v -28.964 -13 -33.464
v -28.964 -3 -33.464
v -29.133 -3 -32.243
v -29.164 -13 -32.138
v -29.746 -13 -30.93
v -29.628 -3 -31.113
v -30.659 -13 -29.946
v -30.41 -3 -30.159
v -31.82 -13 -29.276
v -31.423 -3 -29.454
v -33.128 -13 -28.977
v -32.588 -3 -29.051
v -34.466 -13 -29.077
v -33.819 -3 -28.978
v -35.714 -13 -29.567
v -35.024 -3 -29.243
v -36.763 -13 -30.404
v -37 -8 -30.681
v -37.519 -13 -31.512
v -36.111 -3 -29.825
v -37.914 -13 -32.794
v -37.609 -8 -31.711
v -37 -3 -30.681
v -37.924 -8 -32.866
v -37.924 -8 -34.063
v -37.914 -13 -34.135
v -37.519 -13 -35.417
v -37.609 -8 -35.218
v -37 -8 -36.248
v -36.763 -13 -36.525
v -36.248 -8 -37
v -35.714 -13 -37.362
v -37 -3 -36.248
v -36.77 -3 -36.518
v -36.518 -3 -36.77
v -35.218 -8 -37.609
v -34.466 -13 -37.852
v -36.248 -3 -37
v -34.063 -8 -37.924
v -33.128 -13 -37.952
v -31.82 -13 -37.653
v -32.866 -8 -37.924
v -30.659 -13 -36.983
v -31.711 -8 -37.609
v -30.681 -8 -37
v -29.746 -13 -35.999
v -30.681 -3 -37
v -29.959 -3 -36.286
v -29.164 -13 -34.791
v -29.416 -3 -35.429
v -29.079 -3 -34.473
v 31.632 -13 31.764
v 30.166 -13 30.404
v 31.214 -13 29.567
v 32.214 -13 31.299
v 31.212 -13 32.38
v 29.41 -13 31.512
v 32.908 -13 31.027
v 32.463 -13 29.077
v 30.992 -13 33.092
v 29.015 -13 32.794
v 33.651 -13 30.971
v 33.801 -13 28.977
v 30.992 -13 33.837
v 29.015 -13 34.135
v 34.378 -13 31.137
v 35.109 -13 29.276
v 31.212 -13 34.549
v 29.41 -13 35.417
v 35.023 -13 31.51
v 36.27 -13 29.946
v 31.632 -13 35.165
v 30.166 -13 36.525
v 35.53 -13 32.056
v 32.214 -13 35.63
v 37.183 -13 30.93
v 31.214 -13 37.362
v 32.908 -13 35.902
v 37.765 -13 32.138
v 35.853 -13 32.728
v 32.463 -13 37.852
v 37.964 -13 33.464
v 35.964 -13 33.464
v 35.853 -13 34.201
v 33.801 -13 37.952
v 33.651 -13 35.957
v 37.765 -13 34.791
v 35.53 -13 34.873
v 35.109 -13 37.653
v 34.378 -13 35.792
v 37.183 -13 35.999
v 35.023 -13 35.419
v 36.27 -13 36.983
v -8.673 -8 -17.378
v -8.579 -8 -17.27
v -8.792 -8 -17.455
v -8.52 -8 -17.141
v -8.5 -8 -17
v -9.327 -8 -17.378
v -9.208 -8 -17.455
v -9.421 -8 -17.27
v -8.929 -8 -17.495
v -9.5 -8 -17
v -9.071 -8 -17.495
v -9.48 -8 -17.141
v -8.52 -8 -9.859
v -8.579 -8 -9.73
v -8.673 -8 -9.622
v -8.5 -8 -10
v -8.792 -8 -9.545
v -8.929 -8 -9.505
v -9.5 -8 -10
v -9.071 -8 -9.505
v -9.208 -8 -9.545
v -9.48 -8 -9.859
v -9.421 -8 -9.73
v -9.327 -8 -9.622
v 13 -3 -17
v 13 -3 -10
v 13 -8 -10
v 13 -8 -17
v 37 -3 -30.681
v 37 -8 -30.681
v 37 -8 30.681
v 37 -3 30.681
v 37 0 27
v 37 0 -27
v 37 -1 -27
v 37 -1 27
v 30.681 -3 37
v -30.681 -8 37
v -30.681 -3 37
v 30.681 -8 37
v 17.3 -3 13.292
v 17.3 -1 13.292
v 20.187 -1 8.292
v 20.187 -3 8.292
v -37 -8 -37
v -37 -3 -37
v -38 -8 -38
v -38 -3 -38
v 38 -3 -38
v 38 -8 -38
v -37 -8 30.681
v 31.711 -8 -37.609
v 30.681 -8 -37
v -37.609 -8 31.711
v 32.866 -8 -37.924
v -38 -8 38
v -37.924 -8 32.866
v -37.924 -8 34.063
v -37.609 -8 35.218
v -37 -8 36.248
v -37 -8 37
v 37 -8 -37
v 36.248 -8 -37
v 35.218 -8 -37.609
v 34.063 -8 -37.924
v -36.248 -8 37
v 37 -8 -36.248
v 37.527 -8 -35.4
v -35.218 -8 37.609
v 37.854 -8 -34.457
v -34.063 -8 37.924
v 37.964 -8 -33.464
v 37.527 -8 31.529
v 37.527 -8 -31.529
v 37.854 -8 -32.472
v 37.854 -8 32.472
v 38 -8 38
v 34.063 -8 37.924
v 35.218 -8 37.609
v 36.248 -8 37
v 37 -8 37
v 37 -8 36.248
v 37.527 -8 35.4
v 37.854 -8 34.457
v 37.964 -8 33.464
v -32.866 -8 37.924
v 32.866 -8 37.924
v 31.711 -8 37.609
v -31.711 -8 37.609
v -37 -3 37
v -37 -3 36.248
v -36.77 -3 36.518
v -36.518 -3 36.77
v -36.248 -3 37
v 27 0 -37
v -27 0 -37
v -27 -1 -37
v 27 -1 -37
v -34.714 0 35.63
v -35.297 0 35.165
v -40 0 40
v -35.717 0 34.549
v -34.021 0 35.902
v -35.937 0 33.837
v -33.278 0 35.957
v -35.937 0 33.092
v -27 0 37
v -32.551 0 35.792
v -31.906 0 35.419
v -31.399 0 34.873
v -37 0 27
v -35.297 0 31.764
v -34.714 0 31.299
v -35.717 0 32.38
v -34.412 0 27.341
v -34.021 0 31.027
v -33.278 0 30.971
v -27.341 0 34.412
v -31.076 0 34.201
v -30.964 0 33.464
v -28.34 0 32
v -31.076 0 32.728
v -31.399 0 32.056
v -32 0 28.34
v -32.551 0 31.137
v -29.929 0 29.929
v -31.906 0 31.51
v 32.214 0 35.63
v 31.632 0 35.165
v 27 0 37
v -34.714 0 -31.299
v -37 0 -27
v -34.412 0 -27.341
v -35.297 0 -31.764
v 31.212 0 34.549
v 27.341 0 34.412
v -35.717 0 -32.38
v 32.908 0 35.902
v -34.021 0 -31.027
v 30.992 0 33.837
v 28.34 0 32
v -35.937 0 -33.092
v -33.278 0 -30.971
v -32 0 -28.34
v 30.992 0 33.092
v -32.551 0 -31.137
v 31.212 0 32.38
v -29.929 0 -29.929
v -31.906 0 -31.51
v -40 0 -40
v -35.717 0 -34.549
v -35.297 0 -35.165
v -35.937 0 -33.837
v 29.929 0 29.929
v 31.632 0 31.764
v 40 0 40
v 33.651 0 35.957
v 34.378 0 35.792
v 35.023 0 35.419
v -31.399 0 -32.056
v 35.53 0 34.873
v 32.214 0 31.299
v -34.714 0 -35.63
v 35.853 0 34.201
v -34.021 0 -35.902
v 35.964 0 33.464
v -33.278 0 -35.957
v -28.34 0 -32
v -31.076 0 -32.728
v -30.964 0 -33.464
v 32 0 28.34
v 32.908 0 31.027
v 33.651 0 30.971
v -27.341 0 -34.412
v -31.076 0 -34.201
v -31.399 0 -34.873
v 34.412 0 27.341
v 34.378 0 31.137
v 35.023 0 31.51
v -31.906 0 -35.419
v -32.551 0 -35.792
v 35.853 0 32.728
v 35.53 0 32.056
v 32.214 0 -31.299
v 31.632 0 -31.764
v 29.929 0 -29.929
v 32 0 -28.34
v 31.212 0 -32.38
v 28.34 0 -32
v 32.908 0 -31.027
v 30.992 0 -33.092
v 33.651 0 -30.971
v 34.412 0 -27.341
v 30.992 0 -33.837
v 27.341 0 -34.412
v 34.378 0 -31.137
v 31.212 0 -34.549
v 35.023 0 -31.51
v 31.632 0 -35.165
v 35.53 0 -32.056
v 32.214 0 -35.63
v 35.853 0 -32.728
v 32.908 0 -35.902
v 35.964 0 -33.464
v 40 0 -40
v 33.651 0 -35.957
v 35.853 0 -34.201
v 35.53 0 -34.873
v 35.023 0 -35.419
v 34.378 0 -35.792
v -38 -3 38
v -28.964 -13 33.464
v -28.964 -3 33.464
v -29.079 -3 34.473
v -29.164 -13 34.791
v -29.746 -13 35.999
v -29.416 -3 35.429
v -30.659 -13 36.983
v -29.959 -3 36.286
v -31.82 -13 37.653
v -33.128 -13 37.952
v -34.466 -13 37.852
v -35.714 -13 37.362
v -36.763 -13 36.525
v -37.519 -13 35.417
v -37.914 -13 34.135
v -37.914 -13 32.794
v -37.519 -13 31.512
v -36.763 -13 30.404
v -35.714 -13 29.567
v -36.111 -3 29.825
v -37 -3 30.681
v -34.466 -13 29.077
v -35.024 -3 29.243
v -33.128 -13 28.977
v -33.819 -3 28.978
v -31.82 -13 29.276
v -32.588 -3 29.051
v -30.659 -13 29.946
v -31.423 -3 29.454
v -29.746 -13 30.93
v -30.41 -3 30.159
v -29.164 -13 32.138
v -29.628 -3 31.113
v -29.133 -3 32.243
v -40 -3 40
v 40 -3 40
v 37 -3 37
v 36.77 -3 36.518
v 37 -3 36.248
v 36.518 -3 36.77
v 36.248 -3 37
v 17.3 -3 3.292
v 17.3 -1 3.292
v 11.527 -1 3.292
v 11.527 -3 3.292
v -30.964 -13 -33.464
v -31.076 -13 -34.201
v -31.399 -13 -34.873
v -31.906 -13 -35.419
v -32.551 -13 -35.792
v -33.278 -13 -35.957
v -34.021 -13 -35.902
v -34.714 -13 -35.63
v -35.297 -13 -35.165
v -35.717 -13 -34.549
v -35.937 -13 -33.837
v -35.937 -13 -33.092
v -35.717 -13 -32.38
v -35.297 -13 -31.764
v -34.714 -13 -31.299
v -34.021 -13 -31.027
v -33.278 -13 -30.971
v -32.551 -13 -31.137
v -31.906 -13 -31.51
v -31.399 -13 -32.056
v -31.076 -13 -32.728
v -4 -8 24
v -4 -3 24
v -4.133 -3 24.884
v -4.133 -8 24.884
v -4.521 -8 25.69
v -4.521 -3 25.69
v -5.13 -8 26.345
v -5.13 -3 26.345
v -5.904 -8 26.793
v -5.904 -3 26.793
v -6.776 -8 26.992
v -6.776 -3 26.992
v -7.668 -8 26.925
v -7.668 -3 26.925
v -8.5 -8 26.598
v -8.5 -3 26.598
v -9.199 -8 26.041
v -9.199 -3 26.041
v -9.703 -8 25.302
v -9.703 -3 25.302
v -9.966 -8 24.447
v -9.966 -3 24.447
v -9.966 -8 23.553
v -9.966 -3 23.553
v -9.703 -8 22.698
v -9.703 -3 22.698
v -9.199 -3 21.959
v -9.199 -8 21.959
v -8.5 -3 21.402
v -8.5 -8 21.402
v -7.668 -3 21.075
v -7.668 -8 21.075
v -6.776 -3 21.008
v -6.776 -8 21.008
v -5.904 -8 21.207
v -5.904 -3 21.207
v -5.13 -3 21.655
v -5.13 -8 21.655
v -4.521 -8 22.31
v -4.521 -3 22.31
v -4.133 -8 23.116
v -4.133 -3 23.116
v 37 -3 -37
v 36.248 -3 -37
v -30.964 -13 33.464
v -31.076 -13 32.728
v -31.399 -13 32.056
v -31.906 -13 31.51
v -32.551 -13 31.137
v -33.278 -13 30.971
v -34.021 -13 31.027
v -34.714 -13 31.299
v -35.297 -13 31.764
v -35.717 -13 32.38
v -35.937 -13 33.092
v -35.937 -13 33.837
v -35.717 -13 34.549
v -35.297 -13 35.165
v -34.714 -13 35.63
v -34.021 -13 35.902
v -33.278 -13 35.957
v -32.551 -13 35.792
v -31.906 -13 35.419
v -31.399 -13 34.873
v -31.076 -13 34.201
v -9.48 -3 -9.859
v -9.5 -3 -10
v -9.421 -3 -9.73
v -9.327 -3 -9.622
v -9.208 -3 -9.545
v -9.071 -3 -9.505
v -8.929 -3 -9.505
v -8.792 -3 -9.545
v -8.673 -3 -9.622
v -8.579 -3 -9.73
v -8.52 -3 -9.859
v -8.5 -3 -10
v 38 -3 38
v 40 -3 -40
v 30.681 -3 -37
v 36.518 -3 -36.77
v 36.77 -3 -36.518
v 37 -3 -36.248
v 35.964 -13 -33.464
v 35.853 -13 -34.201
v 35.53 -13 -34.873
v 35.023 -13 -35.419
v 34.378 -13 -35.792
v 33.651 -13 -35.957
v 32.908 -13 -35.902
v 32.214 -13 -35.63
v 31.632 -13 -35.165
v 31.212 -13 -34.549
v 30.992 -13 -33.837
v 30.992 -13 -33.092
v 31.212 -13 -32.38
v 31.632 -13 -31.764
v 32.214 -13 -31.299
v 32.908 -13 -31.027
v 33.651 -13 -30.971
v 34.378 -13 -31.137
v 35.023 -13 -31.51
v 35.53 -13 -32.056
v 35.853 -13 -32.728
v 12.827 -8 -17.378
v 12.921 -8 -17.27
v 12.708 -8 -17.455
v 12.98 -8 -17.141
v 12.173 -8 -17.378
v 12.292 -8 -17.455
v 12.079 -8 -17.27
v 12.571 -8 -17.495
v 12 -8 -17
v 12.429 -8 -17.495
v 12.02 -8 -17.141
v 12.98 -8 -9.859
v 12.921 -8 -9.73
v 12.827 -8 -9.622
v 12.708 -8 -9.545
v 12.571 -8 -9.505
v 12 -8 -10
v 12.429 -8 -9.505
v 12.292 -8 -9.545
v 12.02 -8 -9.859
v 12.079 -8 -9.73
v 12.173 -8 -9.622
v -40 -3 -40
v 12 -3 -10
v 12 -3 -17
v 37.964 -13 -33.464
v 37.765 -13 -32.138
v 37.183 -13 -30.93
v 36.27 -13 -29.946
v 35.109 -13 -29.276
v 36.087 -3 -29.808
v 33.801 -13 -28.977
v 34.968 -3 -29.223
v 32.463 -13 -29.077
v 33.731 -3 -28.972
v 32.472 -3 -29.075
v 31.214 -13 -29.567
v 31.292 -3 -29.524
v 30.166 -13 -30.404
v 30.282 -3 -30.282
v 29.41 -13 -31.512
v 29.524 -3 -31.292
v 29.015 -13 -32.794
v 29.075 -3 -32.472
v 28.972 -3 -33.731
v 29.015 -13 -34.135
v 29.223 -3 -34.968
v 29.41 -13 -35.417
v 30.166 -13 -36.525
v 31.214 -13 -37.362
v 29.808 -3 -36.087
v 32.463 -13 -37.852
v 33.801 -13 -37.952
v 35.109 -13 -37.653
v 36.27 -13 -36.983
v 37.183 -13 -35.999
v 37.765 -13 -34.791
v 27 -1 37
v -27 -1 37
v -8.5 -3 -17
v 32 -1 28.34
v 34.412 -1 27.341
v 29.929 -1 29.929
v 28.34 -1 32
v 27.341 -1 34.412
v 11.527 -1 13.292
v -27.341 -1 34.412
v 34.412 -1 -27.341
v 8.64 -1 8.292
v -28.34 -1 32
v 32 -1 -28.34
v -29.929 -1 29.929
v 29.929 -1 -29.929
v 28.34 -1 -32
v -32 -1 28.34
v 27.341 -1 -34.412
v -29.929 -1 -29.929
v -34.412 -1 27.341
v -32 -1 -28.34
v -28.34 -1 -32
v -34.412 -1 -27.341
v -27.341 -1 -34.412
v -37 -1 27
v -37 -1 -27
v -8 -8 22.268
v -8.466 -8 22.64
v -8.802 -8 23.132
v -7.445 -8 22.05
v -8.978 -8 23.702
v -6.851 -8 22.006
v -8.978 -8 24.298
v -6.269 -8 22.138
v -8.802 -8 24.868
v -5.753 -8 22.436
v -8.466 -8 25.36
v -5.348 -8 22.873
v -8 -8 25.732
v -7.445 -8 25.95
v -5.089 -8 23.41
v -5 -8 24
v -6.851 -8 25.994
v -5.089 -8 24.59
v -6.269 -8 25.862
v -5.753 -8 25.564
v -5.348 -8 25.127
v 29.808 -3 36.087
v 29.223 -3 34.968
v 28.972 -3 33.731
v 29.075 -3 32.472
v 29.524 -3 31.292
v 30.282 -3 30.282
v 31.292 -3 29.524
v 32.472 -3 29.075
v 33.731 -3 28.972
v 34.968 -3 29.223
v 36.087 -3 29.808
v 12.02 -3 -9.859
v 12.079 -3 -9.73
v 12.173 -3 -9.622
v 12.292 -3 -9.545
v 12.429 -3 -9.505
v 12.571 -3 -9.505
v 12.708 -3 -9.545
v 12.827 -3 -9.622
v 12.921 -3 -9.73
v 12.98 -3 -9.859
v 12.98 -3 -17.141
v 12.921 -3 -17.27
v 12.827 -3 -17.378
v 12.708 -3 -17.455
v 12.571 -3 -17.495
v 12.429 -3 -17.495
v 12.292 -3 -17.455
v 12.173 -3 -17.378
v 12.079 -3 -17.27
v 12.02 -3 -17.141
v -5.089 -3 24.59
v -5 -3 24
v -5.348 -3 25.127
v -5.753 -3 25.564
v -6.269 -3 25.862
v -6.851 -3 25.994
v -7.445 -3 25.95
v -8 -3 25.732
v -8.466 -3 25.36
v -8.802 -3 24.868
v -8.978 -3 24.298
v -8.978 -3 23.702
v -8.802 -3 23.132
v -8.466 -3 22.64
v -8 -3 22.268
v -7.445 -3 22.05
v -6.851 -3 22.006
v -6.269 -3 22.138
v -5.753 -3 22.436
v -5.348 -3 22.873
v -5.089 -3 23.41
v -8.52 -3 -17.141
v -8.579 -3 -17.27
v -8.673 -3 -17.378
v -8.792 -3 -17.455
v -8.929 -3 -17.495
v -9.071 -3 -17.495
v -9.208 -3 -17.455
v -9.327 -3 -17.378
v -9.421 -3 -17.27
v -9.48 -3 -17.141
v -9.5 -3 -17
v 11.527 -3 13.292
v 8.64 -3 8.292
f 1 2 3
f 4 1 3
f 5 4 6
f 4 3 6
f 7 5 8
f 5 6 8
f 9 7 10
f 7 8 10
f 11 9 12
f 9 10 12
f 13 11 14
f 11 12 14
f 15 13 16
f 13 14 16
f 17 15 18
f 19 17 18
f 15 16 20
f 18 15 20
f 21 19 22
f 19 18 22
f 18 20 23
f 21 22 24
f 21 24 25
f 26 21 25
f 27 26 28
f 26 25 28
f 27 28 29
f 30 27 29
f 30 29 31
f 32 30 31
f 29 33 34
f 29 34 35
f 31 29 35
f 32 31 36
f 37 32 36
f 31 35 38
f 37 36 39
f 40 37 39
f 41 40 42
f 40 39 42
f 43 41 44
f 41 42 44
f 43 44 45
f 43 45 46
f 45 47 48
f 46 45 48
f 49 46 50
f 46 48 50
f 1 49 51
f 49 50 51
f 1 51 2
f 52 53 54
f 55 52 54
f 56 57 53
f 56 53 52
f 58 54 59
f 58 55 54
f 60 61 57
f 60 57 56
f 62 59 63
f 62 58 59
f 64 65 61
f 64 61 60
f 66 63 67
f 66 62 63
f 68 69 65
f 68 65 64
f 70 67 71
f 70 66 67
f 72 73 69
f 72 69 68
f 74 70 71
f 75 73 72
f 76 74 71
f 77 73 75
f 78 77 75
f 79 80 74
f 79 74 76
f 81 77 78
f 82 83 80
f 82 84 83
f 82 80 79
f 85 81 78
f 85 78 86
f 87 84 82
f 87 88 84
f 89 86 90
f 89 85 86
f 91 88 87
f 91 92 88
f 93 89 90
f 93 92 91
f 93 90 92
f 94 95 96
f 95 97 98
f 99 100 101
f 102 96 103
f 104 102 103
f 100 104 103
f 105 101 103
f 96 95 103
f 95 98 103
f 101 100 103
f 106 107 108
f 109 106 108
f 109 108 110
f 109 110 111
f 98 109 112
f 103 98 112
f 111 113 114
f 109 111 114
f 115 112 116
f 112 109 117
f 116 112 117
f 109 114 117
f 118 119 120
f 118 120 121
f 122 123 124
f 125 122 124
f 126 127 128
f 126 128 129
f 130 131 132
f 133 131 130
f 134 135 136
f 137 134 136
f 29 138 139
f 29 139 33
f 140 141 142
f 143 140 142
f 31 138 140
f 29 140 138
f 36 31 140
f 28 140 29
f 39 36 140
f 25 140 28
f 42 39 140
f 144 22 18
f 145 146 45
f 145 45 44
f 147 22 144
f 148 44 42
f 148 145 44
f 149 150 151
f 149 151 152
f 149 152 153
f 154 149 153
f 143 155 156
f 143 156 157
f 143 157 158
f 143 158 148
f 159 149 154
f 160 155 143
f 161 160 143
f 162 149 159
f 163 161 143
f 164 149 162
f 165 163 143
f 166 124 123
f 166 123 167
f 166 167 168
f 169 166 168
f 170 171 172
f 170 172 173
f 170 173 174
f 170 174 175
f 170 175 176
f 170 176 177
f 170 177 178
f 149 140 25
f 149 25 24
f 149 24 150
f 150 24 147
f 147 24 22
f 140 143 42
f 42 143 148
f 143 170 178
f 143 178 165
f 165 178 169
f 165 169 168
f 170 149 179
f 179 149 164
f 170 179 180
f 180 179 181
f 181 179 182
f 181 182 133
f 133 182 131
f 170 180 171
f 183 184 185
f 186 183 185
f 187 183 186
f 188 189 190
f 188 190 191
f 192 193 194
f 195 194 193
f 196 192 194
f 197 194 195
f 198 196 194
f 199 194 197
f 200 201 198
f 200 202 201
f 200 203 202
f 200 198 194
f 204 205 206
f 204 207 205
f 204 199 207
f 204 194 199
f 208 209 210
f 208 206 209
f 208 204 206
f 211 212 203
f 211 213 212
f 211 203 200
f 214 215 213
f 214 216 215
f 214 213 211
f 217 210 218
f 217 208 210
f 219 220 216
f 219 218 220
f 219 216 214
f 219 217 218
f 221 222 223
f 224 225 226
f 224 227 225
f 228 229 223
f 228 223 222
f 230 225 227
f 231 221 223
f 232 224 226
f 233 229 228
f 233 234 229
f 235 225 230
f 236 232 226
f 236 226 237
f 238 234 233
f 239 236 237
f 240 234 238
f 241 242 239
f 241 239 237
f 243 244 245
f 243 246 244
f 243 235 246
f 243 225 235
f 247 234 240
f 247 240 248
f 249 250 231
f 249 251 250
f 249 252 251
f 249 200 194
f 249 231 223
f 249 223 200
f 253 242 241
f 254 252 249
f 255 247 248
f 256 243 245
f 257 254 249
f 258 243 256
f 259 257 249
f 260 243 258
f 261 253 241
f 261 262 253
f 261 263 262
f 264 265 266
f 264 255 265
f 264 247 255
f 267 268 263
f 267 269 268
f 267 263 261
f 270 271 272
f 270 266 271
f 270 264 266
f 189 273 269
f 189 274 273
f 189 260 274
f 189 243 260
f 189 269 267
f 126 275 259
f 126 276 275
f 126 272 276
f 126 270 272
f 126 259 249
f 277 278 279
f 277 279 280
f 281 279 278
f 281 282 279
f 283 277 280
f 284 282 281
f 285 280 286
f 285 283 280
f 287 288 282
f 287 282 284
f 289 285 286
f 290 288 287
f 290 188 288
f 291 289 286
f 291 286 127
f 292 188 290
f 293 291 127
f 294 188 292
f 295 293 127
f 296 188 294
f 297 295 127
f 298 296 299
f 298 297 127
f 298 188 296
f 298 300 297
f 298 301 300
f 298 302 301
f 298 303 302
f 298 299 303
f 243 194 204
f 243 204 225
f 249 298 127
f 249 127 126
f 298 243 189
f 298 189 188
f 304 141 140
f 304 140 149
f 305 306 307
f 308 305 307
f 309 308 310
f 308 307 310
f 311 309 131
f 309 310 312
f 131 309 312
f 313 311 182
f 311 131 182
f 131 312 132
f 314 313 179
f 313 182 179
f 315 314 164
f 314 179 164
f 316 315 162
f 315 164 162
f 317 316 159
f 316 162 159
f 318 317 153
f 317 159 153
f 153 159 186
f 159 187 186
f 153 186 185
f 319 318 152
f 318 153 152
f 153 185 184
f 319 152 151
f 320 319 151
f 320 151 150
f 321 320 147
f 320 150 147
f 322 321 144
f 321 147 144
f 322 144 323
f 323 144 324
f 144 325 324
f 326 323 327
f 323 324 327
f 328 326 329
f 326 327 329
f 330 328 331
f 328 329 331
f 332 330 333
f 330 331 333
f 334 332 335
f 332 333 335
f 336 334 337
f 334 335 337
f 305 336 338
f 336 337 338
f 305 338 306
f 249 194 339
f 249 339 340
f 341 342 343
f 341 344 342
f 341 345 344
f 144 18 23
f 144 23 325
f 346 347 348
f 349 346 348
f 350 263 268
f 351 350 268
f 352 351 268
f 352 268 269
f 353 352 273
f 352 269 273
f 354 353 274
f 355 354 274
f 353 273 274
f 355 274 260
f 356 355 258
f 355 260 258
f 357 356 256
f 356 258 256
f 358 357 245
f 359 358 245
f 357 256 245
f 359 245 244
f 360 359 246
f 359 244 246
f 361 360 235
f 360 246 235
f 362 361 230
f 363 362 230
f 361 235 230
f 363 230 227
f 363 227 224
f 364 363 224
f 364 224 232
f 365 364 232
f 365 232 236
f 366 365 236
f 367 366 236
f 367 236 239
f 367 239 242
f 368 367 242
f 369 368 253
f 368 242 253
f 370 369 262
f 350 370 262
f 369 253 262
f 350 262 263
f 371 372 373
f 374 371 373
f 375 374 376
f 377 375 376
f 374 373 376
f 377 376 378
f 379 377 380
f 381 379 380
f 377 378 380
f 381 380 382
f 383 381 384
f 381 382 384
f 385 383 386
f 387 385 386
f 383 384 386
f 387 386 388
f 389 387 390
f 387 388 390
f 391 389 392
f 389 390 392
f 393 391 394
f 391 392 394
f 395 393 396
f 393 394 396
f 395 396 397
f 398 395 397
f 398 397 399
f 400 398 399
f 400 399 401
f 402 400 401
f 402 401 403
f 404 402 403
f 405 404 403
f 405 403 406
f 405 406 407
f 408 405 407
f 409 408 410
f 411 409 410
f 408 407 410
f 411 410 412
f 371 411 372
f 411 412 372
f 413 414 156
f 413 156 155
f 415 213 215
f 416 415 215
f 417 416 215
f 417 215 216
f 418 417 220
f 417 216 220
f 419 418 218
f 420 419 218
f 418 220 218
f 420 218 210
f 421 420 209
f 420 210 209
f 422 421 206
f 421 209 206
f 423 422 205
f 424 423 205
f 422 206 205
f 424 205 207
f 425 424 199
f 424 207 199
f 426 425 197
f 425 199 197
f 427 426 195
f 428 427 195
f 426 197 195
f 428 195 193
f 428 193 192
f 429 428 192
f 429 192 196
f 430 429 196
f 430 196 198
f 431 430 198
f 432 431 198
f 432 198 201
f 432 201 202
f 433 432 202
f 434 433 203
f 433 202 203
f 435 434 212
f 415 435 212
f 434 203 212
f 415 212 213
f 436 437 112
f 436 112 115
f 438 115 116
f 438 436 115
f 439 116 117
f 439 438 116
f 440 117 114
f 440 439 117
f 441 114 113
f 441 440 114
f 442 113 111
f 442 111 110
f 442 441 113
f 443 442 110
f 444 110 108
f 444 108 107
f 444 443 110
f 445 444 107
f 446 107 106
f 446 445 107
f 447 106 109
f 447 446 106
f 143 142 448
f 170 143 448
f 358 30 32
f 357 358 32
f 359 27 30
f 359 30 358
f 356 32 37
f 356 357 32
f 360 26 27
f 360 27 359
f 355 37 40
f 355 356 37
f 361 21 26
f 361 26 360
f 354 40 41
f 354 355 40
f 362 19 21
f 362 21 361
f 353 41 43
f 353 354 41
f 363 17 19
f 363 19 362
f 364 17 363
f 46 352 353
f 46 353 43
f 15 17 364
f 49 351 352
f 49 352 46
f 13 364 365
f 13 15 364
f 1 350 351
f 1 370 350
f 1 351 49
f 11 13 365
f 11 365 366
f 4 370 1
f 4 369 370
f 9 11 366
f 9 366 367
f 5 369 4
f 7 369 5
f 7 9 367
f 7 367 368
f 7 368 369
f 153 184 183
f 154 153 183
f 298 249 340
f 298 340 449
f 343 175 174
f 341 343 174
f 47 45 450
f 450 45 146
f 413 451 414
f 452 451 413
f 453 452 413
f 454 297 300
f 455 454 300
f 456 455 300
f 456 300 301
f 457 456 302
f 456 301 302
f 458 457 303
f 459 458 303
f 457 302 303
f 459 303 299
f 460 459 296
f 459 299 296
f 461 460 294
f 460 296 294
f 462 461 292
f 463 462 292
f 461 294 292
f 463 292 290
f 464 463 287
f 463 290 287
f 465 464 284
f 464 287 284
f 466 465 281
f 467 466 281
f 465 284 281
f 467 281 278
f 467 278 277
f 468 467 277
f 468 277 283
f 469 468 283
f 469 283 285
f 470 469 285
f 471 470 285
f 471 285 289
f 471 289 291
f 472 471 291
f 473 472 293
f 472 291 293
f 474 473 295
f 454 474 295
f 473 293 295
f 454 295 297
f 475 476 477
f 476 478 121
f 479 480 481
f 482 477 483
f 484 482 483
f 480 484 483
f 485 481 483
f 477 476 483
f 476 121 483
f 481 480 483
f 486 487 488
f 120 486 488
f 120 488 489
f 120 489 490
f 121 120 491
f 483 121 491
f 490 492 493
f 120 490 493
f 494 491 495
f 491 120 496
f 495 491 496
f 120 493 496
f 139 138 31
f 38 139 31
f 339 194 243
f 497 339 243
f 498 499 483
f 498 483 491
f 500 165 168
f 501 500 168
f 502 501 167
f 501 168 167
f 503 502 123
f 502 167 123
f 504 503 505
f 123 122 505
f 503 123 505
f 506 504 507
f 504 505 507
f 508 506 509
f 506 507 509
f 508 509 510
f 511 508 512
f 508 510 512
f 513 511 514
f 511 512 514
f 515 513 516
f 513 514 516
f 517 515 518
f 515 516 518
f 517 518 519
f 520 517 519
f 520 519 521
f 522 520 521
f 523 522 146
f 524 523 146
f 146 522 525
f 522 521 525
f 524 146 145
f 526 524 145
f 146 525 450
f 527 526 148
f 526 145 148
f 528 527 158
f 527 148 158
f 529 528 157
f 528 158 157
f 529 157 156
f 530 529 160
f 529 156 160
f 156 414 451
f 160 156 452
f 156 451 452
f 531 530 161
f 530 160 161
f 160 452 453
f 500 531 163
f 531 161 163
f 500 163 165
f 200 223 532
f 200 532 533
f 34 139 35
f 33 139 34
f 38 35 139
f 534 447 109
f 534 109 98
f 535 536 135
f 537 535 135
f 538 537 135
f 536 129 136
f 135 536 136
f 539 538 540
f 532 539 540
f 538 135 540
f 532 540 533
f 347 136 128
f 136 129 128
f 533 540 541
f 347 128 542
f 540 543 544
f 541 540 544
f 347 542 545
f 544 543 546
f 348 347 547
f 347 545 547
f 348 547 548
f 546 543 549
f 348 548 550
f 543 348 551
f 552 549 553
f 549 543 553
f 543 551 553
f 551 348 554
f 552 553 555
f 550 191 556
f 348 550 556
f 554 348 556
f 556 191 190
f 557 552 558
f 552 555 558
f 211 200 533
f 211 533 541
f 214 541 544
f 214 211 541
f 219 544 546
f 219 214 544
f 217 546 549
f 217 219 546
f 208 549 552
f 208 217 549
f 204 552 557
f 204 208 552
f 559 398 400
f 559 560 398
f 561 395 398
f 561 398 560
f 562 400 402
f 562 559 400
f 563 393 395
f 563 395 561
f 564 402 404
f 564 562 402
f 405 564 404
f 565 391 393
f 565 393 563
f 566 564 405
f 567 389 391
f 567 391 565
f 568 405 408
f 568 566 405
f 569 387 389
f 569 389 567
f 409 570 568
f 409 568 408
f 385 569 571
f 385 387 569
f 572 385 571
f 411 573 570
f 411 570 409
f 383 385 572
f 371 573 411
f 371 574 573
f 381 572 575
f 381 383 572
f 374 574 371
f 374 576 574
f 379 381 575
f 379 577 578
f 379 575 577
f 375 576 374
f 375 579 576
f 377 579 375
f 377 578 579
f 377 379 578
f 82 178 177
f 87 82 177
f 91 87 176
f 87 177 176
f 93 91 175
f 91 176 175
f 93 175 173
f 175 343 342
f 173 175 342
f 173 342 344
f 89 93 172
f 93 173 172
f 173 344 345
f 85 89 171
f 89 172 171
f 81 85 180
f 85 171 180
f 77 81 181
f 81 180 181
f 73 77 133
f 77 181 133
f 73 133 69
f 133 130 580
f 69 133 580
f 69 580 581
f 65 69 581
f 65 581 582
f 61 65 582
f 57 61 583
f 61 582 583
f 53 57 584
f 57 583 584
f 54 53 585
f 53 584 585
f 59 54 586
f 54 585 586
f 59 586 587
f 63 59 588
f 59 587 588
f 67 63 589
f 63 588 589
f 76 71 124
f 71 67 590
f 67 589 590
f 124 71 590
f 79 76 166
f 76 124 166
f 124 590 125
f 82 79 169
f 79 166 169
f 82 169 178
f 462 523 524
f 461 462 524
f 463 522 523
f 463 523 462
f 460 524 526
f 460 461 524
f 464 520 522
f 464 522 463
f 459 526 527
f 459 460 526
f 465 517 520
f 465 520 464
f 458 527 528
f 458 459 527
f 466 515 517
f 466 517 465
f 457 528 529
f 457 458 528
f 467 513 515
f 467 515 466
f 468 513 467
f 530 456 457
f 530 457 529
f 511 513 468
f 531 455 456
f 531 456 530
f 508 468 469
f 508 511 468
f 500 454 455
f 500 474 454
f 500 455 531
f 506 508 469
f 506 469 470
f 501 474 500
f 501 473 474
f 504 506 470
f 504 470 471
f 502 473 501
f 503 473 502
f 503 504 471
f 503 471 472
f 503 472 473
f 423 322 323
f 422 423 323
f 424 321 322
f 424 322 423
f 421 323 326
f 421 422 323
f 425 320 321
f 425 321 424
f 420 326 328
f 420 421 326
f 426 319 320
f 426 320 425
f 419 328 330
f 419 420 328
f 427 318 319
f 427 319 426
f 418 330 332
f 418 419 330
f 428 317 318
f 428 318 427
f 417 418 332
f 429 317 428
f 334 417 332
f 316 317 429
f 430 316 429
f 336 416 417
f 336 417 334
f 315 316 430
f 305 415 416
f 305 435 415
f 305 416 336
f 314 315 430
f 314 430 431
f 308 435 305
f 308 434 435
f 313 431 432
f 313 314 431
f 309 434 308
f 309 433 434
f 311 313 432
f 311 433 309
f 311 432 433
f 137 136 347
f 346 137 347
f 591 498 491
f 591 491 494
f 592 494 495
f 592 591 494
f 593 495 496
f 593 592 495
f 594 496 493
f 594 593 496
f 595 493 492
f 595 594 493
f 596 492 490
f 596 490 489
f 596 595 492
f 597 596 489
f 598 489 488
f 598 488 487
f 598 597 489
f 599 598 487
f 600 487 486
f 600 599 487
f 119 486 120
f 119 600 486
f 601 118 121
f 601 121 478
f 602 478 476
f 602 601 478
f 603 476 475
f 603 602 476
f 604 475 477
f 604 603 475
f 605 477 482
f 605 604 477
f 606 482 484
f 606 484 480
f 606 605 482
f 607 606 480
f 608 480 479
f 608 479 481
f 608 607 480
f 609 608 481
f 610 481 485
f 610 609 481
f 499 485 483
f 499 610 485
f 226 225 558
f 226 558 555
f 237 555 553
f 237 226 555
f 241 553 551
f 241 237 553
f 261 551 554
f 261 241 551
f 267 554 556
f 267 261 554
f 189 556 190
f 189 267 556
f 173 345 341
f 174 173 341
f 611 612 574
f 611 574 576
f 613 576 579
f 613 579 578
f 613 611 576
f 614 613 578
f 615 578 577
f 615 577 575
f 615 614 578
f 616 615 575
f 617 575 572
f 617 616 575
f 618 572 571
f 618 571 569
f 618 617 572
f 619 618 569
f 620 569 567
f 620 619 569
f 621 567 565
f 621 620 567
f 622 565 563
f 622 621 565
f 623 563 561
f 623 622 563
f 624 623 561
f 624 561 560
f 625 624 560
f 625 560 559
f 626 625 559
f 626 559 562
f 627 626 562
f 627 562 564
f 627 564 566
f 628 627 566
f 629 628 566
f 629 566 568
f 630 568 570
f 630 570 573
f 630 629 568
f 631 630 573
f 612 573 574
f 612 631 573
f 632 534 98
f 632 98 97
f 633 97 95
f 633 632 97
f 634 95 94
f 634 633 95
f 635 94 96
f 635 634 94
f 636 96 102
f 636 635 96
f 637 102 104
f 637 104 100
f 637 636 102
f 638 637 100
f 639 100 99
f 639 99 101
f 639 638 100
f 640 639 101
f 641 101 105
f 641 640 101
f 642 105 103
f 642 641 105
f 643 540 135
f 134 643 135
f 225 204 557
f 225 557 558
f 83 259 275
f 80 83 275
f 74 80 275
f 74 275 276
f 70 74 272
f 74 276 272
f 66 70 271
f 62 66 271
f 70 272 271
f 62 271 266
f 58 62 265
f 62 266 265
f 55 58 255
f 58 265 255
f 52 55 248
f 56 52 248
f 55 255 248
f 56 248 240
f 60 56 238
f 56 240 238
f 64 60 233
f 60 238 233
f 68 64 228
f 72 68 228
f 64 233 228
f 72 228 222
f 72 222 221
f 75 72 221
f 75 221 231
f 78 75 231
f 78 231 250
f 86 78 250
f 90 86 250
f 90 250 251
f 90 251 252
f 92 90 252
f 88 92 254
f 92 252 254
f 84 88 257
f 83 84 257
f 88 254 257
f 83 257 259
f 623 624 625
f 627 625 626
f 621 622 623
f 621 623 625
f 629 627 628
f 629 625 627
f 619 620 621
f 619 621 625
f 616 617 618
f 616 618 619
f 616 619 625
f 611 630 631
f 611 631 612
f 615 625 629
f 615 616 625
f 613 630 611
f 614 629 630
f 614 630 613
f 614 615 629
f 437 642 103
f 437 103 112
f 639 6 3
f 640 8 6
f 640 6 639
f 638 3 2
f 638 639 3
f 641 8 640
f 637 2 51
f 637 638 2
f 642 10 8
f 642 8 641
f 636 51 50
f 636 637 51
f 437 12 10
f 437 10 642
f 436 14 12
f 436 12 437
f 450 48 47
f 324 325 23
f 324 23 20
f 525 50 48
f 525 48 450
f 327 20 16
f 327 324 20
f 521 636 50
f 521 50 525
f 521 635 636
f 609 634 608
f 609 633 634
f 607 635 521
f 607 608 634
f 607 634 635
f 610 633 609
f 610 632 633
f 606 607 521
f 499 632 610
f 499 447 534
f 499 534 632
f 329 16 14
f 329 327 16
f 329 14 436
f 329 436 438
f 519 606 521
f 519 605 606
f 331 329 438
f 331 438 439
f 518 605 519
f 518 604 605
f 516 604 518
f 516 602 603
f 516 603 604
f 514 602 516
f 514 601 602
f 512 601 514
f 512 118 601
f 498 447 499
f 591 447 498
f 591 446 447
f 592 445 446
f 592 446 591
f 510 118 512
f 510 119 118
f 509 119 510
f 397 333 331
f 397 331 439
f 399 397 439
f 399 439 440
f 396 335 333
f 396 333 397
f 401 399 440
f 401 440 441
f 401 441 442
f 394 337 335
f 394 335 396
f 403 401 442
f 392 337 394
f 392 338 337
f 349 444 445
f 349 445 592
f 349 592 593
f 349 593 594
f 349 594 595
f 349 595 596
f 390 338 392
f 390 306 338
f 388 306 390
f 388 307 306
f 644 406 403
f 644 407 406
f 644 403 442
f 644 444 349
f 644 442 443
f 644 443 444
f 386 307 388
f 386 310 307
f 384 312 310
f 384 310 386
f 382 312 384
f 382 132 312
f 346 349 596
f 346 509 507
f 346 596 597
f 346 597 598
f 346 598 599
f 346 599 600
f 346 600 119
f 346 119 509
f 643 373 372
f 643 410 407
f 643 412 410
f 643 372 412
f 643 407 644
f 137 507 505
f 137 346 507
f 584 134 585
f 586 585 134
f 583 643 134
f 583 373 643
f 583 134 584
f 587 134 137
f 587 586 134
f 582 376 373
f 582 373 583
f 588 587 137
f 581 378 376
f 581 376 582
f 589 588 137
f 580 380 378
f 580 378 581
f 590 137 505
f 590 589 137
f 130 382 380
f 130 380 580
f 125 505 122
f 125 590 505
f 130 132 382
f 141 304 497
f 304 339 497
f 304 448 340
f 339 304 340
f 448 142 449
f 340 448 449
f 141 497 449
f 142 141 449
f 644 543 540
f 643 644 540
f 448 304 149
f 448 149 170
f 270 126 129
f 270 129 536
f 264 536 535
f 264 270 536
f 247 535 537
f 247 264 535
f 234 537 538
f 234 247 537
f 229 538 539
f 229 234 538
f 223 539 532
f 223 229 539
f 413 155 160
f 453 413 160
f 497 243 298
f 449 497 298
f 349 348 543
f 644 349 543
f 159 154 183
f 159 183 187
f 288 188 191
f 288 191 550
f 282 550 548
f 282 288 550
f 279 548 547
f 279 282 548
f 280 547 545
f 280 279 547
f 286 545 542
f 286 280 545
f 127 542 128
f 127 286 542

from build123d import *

# Parameters (mm, degrees)
SKETCH2_W           = 80
SKETCH2_H           = 80
BOSS_EXTRUDE1_DEPTH = 3
CUT_EXTRUDE1_DEPTH  = 1
SKETCH5_W           = 76
SKETCH5_H           = 76
BOSS_EXTRUDE2_DEPTH = 5
SKETCH6_W           = 74
SKETCH6_H           = 74
CUT_EXTRUDE2_DEPTH  = 5
SKETCH7_R           = 4.5
BOSS_EXTRUDE3_DEPTH = 10
SKETCH4_R           = 2.5
CUT_EXTRUDE8_DEPTH  = 13
SKETCH9_R           = 3
SKETCH9_R_2         = 2
BOSS_EXTRUDE4_DEPTH = 5
BOSS_EXTRUDE5_DEPTH = 5
CUT_EXTRUDE9_DEPTH  = 10


with BuildPart() as part:
    # Sketch2 → Boss-Extrude1 (new body)
    with BuildSketch(Plane(origin=(0, 0, 0), x_dir=(1, 0, 0), z_dir=(0, 1, 0))):
        Rectangle(SKETCH2_W, SKETCH2_H)
    extrude(amount=-BOSS_EXTRUDE1_DEPTH)

    # Sketch3 → Cut-Extrude1 (cut)
    with BuildSketch(Plane(origin=(0, 0, 0), x_dir=(1, 0, 0), z_dir=(0, 1, 0))):
        with BuildLine():
            Line((-27, 37), (27, 37))
            ThreePointArc((27, 37), (29.928932188, 29.928932188), (37, 27))
            Line((37, 27), (37, -27))
            ThreePointArc((37, -27), (29.928932188, -29.928932188), (27, -37))
            Line((27, -37), (-27, -37))
            ThreePointArc((-27, -37), (-29.928932188, -29.928932188), (-37, -27))
            Line((-37, -27), (-37, 27))
            ThreePointArc((-37, 27), (-29.928932188, 29.928932188), (-27, 37))
        make_face()
    extrude(amount=-CUT_EXTRUDE1_DEPTH, mode=Mode.SUBTRACT)

    # Sketch5 → Boss-Extrude2 (add)
    with BuildSketch(Plane.XZ.offset(3)):
        Rectangle(SKETCH5_W, SKETCH5_H)
    extrude(amount=BOSS_EXTRUDE2_DEPTH)

    # Sketch6 → Cut-Extrude2 (cut)
    with BuildSketch(Plane.XZ.offset(8)):
        Rectangle(SKETCH6_W, SKETCH6_H)
    extrude(amount=-CUT_EXTRUDE2_DEPTH, mode=Mode.SUBTRACT)

    # Sketch7 → Boss-Extrude3 (add)
    with BuildSketch(Plane.XZ.offset(3)):
        with Locations((-33.464466094, 33.46446609)):
            Circle(SKETCH7_R)
        with Locations((33.46446609, 33.46446609)):
            Circle(SKETCH7_R)
        with Locations((-33.464466094, -33.464466094)):
            Circle(SKETCH7_R)
        with Locations((33.46446609, -33.464466094)):
            Circle(SKETCH7_R)
    extrude(amount=BOSS_EXTRUDE3_DEPTH)

    # Sketch4 → Cut-Extrude8 (cut)
    with BuildSketch(Plane(origin=(0, 0, 0), x_dir=(1, 0, 0), z_dir=(0, 1, 0))):
        with Locations((33.46446609, 33.464466094)):
            Circle(SKETCH4_R)
        with Locations((-33.464466094, 33.464466094)):
            Circle(SKETCH4_R)
        with Locations((-33.464466094, -33.46446609)):
            Circle(SKETCH4_R)
        with Locations((33.46446609, -33.46446609)):
            Circle(SKETCH4_R)
    extrude(amount=-CUT_EXTRUDE8_DEPTH, mode=Mode.SUBTRACT)

    # Sketch9 → Boss-Extrude4 (add)
    with BuildSketch(Plane.XZ.offset(3)):
        with Locations((-7, 24)):
            Circle(SKETCH9_R)
        with Locations((-7, 24)):
            Circle(SKETCH9_R_2, mode=Mode.SUBTRACT)
    extrude(amount=BOSS_EXTRUDE4_DEPTH)

    # Sketch10 → Boss-Extrude5 (add)
    with BuildSketch(Plane.XZ.offset(3)):
        with BuildLine():
            Line((-8.5, -10), (-8.5, -17))
            ThreePointArc((-8.5, -17), (-9, -17.5), (-9.5, -17))
            Line((-9.5, -17), (-9.5, -10))
            ThreePointArc((-9.5, -10), (-9, -9.5), (-8.5, -10))
        make_face()
        with BuildLine():
            Line((13, -10), (13, -17))
            ThreePointArc((13, -17), (12.5, -17.5), (12, -17))
            Line((12, -17), (12, -10))
            ThreePointArc((12, -10), (12.5, -9.5), (13, -10))
        make_face()
    extrude(amount=BOSS_EXTRUDE5_DEPTH)

    # Sketch11 → Cut-Extrude9 (cut)
    with BuildSketch(Plane(origin=(0, -1, 0), x_dir=(1, 0, 0), z_dir=(0, 1, 0))):
        Polygon((17.300412364, -3.292028925), (11.526909672, -3.292028925), (8.640158326, -8.292028925), (11.526909672, -13.292028925), (17.300412364, -13.292028925), (20.18716371, -8.292028925), align=None)
    extrude(amount=-CUT_EXTRUDE9_DEPTH, mode=Mode.SUBTRACT)


solid = part.part
